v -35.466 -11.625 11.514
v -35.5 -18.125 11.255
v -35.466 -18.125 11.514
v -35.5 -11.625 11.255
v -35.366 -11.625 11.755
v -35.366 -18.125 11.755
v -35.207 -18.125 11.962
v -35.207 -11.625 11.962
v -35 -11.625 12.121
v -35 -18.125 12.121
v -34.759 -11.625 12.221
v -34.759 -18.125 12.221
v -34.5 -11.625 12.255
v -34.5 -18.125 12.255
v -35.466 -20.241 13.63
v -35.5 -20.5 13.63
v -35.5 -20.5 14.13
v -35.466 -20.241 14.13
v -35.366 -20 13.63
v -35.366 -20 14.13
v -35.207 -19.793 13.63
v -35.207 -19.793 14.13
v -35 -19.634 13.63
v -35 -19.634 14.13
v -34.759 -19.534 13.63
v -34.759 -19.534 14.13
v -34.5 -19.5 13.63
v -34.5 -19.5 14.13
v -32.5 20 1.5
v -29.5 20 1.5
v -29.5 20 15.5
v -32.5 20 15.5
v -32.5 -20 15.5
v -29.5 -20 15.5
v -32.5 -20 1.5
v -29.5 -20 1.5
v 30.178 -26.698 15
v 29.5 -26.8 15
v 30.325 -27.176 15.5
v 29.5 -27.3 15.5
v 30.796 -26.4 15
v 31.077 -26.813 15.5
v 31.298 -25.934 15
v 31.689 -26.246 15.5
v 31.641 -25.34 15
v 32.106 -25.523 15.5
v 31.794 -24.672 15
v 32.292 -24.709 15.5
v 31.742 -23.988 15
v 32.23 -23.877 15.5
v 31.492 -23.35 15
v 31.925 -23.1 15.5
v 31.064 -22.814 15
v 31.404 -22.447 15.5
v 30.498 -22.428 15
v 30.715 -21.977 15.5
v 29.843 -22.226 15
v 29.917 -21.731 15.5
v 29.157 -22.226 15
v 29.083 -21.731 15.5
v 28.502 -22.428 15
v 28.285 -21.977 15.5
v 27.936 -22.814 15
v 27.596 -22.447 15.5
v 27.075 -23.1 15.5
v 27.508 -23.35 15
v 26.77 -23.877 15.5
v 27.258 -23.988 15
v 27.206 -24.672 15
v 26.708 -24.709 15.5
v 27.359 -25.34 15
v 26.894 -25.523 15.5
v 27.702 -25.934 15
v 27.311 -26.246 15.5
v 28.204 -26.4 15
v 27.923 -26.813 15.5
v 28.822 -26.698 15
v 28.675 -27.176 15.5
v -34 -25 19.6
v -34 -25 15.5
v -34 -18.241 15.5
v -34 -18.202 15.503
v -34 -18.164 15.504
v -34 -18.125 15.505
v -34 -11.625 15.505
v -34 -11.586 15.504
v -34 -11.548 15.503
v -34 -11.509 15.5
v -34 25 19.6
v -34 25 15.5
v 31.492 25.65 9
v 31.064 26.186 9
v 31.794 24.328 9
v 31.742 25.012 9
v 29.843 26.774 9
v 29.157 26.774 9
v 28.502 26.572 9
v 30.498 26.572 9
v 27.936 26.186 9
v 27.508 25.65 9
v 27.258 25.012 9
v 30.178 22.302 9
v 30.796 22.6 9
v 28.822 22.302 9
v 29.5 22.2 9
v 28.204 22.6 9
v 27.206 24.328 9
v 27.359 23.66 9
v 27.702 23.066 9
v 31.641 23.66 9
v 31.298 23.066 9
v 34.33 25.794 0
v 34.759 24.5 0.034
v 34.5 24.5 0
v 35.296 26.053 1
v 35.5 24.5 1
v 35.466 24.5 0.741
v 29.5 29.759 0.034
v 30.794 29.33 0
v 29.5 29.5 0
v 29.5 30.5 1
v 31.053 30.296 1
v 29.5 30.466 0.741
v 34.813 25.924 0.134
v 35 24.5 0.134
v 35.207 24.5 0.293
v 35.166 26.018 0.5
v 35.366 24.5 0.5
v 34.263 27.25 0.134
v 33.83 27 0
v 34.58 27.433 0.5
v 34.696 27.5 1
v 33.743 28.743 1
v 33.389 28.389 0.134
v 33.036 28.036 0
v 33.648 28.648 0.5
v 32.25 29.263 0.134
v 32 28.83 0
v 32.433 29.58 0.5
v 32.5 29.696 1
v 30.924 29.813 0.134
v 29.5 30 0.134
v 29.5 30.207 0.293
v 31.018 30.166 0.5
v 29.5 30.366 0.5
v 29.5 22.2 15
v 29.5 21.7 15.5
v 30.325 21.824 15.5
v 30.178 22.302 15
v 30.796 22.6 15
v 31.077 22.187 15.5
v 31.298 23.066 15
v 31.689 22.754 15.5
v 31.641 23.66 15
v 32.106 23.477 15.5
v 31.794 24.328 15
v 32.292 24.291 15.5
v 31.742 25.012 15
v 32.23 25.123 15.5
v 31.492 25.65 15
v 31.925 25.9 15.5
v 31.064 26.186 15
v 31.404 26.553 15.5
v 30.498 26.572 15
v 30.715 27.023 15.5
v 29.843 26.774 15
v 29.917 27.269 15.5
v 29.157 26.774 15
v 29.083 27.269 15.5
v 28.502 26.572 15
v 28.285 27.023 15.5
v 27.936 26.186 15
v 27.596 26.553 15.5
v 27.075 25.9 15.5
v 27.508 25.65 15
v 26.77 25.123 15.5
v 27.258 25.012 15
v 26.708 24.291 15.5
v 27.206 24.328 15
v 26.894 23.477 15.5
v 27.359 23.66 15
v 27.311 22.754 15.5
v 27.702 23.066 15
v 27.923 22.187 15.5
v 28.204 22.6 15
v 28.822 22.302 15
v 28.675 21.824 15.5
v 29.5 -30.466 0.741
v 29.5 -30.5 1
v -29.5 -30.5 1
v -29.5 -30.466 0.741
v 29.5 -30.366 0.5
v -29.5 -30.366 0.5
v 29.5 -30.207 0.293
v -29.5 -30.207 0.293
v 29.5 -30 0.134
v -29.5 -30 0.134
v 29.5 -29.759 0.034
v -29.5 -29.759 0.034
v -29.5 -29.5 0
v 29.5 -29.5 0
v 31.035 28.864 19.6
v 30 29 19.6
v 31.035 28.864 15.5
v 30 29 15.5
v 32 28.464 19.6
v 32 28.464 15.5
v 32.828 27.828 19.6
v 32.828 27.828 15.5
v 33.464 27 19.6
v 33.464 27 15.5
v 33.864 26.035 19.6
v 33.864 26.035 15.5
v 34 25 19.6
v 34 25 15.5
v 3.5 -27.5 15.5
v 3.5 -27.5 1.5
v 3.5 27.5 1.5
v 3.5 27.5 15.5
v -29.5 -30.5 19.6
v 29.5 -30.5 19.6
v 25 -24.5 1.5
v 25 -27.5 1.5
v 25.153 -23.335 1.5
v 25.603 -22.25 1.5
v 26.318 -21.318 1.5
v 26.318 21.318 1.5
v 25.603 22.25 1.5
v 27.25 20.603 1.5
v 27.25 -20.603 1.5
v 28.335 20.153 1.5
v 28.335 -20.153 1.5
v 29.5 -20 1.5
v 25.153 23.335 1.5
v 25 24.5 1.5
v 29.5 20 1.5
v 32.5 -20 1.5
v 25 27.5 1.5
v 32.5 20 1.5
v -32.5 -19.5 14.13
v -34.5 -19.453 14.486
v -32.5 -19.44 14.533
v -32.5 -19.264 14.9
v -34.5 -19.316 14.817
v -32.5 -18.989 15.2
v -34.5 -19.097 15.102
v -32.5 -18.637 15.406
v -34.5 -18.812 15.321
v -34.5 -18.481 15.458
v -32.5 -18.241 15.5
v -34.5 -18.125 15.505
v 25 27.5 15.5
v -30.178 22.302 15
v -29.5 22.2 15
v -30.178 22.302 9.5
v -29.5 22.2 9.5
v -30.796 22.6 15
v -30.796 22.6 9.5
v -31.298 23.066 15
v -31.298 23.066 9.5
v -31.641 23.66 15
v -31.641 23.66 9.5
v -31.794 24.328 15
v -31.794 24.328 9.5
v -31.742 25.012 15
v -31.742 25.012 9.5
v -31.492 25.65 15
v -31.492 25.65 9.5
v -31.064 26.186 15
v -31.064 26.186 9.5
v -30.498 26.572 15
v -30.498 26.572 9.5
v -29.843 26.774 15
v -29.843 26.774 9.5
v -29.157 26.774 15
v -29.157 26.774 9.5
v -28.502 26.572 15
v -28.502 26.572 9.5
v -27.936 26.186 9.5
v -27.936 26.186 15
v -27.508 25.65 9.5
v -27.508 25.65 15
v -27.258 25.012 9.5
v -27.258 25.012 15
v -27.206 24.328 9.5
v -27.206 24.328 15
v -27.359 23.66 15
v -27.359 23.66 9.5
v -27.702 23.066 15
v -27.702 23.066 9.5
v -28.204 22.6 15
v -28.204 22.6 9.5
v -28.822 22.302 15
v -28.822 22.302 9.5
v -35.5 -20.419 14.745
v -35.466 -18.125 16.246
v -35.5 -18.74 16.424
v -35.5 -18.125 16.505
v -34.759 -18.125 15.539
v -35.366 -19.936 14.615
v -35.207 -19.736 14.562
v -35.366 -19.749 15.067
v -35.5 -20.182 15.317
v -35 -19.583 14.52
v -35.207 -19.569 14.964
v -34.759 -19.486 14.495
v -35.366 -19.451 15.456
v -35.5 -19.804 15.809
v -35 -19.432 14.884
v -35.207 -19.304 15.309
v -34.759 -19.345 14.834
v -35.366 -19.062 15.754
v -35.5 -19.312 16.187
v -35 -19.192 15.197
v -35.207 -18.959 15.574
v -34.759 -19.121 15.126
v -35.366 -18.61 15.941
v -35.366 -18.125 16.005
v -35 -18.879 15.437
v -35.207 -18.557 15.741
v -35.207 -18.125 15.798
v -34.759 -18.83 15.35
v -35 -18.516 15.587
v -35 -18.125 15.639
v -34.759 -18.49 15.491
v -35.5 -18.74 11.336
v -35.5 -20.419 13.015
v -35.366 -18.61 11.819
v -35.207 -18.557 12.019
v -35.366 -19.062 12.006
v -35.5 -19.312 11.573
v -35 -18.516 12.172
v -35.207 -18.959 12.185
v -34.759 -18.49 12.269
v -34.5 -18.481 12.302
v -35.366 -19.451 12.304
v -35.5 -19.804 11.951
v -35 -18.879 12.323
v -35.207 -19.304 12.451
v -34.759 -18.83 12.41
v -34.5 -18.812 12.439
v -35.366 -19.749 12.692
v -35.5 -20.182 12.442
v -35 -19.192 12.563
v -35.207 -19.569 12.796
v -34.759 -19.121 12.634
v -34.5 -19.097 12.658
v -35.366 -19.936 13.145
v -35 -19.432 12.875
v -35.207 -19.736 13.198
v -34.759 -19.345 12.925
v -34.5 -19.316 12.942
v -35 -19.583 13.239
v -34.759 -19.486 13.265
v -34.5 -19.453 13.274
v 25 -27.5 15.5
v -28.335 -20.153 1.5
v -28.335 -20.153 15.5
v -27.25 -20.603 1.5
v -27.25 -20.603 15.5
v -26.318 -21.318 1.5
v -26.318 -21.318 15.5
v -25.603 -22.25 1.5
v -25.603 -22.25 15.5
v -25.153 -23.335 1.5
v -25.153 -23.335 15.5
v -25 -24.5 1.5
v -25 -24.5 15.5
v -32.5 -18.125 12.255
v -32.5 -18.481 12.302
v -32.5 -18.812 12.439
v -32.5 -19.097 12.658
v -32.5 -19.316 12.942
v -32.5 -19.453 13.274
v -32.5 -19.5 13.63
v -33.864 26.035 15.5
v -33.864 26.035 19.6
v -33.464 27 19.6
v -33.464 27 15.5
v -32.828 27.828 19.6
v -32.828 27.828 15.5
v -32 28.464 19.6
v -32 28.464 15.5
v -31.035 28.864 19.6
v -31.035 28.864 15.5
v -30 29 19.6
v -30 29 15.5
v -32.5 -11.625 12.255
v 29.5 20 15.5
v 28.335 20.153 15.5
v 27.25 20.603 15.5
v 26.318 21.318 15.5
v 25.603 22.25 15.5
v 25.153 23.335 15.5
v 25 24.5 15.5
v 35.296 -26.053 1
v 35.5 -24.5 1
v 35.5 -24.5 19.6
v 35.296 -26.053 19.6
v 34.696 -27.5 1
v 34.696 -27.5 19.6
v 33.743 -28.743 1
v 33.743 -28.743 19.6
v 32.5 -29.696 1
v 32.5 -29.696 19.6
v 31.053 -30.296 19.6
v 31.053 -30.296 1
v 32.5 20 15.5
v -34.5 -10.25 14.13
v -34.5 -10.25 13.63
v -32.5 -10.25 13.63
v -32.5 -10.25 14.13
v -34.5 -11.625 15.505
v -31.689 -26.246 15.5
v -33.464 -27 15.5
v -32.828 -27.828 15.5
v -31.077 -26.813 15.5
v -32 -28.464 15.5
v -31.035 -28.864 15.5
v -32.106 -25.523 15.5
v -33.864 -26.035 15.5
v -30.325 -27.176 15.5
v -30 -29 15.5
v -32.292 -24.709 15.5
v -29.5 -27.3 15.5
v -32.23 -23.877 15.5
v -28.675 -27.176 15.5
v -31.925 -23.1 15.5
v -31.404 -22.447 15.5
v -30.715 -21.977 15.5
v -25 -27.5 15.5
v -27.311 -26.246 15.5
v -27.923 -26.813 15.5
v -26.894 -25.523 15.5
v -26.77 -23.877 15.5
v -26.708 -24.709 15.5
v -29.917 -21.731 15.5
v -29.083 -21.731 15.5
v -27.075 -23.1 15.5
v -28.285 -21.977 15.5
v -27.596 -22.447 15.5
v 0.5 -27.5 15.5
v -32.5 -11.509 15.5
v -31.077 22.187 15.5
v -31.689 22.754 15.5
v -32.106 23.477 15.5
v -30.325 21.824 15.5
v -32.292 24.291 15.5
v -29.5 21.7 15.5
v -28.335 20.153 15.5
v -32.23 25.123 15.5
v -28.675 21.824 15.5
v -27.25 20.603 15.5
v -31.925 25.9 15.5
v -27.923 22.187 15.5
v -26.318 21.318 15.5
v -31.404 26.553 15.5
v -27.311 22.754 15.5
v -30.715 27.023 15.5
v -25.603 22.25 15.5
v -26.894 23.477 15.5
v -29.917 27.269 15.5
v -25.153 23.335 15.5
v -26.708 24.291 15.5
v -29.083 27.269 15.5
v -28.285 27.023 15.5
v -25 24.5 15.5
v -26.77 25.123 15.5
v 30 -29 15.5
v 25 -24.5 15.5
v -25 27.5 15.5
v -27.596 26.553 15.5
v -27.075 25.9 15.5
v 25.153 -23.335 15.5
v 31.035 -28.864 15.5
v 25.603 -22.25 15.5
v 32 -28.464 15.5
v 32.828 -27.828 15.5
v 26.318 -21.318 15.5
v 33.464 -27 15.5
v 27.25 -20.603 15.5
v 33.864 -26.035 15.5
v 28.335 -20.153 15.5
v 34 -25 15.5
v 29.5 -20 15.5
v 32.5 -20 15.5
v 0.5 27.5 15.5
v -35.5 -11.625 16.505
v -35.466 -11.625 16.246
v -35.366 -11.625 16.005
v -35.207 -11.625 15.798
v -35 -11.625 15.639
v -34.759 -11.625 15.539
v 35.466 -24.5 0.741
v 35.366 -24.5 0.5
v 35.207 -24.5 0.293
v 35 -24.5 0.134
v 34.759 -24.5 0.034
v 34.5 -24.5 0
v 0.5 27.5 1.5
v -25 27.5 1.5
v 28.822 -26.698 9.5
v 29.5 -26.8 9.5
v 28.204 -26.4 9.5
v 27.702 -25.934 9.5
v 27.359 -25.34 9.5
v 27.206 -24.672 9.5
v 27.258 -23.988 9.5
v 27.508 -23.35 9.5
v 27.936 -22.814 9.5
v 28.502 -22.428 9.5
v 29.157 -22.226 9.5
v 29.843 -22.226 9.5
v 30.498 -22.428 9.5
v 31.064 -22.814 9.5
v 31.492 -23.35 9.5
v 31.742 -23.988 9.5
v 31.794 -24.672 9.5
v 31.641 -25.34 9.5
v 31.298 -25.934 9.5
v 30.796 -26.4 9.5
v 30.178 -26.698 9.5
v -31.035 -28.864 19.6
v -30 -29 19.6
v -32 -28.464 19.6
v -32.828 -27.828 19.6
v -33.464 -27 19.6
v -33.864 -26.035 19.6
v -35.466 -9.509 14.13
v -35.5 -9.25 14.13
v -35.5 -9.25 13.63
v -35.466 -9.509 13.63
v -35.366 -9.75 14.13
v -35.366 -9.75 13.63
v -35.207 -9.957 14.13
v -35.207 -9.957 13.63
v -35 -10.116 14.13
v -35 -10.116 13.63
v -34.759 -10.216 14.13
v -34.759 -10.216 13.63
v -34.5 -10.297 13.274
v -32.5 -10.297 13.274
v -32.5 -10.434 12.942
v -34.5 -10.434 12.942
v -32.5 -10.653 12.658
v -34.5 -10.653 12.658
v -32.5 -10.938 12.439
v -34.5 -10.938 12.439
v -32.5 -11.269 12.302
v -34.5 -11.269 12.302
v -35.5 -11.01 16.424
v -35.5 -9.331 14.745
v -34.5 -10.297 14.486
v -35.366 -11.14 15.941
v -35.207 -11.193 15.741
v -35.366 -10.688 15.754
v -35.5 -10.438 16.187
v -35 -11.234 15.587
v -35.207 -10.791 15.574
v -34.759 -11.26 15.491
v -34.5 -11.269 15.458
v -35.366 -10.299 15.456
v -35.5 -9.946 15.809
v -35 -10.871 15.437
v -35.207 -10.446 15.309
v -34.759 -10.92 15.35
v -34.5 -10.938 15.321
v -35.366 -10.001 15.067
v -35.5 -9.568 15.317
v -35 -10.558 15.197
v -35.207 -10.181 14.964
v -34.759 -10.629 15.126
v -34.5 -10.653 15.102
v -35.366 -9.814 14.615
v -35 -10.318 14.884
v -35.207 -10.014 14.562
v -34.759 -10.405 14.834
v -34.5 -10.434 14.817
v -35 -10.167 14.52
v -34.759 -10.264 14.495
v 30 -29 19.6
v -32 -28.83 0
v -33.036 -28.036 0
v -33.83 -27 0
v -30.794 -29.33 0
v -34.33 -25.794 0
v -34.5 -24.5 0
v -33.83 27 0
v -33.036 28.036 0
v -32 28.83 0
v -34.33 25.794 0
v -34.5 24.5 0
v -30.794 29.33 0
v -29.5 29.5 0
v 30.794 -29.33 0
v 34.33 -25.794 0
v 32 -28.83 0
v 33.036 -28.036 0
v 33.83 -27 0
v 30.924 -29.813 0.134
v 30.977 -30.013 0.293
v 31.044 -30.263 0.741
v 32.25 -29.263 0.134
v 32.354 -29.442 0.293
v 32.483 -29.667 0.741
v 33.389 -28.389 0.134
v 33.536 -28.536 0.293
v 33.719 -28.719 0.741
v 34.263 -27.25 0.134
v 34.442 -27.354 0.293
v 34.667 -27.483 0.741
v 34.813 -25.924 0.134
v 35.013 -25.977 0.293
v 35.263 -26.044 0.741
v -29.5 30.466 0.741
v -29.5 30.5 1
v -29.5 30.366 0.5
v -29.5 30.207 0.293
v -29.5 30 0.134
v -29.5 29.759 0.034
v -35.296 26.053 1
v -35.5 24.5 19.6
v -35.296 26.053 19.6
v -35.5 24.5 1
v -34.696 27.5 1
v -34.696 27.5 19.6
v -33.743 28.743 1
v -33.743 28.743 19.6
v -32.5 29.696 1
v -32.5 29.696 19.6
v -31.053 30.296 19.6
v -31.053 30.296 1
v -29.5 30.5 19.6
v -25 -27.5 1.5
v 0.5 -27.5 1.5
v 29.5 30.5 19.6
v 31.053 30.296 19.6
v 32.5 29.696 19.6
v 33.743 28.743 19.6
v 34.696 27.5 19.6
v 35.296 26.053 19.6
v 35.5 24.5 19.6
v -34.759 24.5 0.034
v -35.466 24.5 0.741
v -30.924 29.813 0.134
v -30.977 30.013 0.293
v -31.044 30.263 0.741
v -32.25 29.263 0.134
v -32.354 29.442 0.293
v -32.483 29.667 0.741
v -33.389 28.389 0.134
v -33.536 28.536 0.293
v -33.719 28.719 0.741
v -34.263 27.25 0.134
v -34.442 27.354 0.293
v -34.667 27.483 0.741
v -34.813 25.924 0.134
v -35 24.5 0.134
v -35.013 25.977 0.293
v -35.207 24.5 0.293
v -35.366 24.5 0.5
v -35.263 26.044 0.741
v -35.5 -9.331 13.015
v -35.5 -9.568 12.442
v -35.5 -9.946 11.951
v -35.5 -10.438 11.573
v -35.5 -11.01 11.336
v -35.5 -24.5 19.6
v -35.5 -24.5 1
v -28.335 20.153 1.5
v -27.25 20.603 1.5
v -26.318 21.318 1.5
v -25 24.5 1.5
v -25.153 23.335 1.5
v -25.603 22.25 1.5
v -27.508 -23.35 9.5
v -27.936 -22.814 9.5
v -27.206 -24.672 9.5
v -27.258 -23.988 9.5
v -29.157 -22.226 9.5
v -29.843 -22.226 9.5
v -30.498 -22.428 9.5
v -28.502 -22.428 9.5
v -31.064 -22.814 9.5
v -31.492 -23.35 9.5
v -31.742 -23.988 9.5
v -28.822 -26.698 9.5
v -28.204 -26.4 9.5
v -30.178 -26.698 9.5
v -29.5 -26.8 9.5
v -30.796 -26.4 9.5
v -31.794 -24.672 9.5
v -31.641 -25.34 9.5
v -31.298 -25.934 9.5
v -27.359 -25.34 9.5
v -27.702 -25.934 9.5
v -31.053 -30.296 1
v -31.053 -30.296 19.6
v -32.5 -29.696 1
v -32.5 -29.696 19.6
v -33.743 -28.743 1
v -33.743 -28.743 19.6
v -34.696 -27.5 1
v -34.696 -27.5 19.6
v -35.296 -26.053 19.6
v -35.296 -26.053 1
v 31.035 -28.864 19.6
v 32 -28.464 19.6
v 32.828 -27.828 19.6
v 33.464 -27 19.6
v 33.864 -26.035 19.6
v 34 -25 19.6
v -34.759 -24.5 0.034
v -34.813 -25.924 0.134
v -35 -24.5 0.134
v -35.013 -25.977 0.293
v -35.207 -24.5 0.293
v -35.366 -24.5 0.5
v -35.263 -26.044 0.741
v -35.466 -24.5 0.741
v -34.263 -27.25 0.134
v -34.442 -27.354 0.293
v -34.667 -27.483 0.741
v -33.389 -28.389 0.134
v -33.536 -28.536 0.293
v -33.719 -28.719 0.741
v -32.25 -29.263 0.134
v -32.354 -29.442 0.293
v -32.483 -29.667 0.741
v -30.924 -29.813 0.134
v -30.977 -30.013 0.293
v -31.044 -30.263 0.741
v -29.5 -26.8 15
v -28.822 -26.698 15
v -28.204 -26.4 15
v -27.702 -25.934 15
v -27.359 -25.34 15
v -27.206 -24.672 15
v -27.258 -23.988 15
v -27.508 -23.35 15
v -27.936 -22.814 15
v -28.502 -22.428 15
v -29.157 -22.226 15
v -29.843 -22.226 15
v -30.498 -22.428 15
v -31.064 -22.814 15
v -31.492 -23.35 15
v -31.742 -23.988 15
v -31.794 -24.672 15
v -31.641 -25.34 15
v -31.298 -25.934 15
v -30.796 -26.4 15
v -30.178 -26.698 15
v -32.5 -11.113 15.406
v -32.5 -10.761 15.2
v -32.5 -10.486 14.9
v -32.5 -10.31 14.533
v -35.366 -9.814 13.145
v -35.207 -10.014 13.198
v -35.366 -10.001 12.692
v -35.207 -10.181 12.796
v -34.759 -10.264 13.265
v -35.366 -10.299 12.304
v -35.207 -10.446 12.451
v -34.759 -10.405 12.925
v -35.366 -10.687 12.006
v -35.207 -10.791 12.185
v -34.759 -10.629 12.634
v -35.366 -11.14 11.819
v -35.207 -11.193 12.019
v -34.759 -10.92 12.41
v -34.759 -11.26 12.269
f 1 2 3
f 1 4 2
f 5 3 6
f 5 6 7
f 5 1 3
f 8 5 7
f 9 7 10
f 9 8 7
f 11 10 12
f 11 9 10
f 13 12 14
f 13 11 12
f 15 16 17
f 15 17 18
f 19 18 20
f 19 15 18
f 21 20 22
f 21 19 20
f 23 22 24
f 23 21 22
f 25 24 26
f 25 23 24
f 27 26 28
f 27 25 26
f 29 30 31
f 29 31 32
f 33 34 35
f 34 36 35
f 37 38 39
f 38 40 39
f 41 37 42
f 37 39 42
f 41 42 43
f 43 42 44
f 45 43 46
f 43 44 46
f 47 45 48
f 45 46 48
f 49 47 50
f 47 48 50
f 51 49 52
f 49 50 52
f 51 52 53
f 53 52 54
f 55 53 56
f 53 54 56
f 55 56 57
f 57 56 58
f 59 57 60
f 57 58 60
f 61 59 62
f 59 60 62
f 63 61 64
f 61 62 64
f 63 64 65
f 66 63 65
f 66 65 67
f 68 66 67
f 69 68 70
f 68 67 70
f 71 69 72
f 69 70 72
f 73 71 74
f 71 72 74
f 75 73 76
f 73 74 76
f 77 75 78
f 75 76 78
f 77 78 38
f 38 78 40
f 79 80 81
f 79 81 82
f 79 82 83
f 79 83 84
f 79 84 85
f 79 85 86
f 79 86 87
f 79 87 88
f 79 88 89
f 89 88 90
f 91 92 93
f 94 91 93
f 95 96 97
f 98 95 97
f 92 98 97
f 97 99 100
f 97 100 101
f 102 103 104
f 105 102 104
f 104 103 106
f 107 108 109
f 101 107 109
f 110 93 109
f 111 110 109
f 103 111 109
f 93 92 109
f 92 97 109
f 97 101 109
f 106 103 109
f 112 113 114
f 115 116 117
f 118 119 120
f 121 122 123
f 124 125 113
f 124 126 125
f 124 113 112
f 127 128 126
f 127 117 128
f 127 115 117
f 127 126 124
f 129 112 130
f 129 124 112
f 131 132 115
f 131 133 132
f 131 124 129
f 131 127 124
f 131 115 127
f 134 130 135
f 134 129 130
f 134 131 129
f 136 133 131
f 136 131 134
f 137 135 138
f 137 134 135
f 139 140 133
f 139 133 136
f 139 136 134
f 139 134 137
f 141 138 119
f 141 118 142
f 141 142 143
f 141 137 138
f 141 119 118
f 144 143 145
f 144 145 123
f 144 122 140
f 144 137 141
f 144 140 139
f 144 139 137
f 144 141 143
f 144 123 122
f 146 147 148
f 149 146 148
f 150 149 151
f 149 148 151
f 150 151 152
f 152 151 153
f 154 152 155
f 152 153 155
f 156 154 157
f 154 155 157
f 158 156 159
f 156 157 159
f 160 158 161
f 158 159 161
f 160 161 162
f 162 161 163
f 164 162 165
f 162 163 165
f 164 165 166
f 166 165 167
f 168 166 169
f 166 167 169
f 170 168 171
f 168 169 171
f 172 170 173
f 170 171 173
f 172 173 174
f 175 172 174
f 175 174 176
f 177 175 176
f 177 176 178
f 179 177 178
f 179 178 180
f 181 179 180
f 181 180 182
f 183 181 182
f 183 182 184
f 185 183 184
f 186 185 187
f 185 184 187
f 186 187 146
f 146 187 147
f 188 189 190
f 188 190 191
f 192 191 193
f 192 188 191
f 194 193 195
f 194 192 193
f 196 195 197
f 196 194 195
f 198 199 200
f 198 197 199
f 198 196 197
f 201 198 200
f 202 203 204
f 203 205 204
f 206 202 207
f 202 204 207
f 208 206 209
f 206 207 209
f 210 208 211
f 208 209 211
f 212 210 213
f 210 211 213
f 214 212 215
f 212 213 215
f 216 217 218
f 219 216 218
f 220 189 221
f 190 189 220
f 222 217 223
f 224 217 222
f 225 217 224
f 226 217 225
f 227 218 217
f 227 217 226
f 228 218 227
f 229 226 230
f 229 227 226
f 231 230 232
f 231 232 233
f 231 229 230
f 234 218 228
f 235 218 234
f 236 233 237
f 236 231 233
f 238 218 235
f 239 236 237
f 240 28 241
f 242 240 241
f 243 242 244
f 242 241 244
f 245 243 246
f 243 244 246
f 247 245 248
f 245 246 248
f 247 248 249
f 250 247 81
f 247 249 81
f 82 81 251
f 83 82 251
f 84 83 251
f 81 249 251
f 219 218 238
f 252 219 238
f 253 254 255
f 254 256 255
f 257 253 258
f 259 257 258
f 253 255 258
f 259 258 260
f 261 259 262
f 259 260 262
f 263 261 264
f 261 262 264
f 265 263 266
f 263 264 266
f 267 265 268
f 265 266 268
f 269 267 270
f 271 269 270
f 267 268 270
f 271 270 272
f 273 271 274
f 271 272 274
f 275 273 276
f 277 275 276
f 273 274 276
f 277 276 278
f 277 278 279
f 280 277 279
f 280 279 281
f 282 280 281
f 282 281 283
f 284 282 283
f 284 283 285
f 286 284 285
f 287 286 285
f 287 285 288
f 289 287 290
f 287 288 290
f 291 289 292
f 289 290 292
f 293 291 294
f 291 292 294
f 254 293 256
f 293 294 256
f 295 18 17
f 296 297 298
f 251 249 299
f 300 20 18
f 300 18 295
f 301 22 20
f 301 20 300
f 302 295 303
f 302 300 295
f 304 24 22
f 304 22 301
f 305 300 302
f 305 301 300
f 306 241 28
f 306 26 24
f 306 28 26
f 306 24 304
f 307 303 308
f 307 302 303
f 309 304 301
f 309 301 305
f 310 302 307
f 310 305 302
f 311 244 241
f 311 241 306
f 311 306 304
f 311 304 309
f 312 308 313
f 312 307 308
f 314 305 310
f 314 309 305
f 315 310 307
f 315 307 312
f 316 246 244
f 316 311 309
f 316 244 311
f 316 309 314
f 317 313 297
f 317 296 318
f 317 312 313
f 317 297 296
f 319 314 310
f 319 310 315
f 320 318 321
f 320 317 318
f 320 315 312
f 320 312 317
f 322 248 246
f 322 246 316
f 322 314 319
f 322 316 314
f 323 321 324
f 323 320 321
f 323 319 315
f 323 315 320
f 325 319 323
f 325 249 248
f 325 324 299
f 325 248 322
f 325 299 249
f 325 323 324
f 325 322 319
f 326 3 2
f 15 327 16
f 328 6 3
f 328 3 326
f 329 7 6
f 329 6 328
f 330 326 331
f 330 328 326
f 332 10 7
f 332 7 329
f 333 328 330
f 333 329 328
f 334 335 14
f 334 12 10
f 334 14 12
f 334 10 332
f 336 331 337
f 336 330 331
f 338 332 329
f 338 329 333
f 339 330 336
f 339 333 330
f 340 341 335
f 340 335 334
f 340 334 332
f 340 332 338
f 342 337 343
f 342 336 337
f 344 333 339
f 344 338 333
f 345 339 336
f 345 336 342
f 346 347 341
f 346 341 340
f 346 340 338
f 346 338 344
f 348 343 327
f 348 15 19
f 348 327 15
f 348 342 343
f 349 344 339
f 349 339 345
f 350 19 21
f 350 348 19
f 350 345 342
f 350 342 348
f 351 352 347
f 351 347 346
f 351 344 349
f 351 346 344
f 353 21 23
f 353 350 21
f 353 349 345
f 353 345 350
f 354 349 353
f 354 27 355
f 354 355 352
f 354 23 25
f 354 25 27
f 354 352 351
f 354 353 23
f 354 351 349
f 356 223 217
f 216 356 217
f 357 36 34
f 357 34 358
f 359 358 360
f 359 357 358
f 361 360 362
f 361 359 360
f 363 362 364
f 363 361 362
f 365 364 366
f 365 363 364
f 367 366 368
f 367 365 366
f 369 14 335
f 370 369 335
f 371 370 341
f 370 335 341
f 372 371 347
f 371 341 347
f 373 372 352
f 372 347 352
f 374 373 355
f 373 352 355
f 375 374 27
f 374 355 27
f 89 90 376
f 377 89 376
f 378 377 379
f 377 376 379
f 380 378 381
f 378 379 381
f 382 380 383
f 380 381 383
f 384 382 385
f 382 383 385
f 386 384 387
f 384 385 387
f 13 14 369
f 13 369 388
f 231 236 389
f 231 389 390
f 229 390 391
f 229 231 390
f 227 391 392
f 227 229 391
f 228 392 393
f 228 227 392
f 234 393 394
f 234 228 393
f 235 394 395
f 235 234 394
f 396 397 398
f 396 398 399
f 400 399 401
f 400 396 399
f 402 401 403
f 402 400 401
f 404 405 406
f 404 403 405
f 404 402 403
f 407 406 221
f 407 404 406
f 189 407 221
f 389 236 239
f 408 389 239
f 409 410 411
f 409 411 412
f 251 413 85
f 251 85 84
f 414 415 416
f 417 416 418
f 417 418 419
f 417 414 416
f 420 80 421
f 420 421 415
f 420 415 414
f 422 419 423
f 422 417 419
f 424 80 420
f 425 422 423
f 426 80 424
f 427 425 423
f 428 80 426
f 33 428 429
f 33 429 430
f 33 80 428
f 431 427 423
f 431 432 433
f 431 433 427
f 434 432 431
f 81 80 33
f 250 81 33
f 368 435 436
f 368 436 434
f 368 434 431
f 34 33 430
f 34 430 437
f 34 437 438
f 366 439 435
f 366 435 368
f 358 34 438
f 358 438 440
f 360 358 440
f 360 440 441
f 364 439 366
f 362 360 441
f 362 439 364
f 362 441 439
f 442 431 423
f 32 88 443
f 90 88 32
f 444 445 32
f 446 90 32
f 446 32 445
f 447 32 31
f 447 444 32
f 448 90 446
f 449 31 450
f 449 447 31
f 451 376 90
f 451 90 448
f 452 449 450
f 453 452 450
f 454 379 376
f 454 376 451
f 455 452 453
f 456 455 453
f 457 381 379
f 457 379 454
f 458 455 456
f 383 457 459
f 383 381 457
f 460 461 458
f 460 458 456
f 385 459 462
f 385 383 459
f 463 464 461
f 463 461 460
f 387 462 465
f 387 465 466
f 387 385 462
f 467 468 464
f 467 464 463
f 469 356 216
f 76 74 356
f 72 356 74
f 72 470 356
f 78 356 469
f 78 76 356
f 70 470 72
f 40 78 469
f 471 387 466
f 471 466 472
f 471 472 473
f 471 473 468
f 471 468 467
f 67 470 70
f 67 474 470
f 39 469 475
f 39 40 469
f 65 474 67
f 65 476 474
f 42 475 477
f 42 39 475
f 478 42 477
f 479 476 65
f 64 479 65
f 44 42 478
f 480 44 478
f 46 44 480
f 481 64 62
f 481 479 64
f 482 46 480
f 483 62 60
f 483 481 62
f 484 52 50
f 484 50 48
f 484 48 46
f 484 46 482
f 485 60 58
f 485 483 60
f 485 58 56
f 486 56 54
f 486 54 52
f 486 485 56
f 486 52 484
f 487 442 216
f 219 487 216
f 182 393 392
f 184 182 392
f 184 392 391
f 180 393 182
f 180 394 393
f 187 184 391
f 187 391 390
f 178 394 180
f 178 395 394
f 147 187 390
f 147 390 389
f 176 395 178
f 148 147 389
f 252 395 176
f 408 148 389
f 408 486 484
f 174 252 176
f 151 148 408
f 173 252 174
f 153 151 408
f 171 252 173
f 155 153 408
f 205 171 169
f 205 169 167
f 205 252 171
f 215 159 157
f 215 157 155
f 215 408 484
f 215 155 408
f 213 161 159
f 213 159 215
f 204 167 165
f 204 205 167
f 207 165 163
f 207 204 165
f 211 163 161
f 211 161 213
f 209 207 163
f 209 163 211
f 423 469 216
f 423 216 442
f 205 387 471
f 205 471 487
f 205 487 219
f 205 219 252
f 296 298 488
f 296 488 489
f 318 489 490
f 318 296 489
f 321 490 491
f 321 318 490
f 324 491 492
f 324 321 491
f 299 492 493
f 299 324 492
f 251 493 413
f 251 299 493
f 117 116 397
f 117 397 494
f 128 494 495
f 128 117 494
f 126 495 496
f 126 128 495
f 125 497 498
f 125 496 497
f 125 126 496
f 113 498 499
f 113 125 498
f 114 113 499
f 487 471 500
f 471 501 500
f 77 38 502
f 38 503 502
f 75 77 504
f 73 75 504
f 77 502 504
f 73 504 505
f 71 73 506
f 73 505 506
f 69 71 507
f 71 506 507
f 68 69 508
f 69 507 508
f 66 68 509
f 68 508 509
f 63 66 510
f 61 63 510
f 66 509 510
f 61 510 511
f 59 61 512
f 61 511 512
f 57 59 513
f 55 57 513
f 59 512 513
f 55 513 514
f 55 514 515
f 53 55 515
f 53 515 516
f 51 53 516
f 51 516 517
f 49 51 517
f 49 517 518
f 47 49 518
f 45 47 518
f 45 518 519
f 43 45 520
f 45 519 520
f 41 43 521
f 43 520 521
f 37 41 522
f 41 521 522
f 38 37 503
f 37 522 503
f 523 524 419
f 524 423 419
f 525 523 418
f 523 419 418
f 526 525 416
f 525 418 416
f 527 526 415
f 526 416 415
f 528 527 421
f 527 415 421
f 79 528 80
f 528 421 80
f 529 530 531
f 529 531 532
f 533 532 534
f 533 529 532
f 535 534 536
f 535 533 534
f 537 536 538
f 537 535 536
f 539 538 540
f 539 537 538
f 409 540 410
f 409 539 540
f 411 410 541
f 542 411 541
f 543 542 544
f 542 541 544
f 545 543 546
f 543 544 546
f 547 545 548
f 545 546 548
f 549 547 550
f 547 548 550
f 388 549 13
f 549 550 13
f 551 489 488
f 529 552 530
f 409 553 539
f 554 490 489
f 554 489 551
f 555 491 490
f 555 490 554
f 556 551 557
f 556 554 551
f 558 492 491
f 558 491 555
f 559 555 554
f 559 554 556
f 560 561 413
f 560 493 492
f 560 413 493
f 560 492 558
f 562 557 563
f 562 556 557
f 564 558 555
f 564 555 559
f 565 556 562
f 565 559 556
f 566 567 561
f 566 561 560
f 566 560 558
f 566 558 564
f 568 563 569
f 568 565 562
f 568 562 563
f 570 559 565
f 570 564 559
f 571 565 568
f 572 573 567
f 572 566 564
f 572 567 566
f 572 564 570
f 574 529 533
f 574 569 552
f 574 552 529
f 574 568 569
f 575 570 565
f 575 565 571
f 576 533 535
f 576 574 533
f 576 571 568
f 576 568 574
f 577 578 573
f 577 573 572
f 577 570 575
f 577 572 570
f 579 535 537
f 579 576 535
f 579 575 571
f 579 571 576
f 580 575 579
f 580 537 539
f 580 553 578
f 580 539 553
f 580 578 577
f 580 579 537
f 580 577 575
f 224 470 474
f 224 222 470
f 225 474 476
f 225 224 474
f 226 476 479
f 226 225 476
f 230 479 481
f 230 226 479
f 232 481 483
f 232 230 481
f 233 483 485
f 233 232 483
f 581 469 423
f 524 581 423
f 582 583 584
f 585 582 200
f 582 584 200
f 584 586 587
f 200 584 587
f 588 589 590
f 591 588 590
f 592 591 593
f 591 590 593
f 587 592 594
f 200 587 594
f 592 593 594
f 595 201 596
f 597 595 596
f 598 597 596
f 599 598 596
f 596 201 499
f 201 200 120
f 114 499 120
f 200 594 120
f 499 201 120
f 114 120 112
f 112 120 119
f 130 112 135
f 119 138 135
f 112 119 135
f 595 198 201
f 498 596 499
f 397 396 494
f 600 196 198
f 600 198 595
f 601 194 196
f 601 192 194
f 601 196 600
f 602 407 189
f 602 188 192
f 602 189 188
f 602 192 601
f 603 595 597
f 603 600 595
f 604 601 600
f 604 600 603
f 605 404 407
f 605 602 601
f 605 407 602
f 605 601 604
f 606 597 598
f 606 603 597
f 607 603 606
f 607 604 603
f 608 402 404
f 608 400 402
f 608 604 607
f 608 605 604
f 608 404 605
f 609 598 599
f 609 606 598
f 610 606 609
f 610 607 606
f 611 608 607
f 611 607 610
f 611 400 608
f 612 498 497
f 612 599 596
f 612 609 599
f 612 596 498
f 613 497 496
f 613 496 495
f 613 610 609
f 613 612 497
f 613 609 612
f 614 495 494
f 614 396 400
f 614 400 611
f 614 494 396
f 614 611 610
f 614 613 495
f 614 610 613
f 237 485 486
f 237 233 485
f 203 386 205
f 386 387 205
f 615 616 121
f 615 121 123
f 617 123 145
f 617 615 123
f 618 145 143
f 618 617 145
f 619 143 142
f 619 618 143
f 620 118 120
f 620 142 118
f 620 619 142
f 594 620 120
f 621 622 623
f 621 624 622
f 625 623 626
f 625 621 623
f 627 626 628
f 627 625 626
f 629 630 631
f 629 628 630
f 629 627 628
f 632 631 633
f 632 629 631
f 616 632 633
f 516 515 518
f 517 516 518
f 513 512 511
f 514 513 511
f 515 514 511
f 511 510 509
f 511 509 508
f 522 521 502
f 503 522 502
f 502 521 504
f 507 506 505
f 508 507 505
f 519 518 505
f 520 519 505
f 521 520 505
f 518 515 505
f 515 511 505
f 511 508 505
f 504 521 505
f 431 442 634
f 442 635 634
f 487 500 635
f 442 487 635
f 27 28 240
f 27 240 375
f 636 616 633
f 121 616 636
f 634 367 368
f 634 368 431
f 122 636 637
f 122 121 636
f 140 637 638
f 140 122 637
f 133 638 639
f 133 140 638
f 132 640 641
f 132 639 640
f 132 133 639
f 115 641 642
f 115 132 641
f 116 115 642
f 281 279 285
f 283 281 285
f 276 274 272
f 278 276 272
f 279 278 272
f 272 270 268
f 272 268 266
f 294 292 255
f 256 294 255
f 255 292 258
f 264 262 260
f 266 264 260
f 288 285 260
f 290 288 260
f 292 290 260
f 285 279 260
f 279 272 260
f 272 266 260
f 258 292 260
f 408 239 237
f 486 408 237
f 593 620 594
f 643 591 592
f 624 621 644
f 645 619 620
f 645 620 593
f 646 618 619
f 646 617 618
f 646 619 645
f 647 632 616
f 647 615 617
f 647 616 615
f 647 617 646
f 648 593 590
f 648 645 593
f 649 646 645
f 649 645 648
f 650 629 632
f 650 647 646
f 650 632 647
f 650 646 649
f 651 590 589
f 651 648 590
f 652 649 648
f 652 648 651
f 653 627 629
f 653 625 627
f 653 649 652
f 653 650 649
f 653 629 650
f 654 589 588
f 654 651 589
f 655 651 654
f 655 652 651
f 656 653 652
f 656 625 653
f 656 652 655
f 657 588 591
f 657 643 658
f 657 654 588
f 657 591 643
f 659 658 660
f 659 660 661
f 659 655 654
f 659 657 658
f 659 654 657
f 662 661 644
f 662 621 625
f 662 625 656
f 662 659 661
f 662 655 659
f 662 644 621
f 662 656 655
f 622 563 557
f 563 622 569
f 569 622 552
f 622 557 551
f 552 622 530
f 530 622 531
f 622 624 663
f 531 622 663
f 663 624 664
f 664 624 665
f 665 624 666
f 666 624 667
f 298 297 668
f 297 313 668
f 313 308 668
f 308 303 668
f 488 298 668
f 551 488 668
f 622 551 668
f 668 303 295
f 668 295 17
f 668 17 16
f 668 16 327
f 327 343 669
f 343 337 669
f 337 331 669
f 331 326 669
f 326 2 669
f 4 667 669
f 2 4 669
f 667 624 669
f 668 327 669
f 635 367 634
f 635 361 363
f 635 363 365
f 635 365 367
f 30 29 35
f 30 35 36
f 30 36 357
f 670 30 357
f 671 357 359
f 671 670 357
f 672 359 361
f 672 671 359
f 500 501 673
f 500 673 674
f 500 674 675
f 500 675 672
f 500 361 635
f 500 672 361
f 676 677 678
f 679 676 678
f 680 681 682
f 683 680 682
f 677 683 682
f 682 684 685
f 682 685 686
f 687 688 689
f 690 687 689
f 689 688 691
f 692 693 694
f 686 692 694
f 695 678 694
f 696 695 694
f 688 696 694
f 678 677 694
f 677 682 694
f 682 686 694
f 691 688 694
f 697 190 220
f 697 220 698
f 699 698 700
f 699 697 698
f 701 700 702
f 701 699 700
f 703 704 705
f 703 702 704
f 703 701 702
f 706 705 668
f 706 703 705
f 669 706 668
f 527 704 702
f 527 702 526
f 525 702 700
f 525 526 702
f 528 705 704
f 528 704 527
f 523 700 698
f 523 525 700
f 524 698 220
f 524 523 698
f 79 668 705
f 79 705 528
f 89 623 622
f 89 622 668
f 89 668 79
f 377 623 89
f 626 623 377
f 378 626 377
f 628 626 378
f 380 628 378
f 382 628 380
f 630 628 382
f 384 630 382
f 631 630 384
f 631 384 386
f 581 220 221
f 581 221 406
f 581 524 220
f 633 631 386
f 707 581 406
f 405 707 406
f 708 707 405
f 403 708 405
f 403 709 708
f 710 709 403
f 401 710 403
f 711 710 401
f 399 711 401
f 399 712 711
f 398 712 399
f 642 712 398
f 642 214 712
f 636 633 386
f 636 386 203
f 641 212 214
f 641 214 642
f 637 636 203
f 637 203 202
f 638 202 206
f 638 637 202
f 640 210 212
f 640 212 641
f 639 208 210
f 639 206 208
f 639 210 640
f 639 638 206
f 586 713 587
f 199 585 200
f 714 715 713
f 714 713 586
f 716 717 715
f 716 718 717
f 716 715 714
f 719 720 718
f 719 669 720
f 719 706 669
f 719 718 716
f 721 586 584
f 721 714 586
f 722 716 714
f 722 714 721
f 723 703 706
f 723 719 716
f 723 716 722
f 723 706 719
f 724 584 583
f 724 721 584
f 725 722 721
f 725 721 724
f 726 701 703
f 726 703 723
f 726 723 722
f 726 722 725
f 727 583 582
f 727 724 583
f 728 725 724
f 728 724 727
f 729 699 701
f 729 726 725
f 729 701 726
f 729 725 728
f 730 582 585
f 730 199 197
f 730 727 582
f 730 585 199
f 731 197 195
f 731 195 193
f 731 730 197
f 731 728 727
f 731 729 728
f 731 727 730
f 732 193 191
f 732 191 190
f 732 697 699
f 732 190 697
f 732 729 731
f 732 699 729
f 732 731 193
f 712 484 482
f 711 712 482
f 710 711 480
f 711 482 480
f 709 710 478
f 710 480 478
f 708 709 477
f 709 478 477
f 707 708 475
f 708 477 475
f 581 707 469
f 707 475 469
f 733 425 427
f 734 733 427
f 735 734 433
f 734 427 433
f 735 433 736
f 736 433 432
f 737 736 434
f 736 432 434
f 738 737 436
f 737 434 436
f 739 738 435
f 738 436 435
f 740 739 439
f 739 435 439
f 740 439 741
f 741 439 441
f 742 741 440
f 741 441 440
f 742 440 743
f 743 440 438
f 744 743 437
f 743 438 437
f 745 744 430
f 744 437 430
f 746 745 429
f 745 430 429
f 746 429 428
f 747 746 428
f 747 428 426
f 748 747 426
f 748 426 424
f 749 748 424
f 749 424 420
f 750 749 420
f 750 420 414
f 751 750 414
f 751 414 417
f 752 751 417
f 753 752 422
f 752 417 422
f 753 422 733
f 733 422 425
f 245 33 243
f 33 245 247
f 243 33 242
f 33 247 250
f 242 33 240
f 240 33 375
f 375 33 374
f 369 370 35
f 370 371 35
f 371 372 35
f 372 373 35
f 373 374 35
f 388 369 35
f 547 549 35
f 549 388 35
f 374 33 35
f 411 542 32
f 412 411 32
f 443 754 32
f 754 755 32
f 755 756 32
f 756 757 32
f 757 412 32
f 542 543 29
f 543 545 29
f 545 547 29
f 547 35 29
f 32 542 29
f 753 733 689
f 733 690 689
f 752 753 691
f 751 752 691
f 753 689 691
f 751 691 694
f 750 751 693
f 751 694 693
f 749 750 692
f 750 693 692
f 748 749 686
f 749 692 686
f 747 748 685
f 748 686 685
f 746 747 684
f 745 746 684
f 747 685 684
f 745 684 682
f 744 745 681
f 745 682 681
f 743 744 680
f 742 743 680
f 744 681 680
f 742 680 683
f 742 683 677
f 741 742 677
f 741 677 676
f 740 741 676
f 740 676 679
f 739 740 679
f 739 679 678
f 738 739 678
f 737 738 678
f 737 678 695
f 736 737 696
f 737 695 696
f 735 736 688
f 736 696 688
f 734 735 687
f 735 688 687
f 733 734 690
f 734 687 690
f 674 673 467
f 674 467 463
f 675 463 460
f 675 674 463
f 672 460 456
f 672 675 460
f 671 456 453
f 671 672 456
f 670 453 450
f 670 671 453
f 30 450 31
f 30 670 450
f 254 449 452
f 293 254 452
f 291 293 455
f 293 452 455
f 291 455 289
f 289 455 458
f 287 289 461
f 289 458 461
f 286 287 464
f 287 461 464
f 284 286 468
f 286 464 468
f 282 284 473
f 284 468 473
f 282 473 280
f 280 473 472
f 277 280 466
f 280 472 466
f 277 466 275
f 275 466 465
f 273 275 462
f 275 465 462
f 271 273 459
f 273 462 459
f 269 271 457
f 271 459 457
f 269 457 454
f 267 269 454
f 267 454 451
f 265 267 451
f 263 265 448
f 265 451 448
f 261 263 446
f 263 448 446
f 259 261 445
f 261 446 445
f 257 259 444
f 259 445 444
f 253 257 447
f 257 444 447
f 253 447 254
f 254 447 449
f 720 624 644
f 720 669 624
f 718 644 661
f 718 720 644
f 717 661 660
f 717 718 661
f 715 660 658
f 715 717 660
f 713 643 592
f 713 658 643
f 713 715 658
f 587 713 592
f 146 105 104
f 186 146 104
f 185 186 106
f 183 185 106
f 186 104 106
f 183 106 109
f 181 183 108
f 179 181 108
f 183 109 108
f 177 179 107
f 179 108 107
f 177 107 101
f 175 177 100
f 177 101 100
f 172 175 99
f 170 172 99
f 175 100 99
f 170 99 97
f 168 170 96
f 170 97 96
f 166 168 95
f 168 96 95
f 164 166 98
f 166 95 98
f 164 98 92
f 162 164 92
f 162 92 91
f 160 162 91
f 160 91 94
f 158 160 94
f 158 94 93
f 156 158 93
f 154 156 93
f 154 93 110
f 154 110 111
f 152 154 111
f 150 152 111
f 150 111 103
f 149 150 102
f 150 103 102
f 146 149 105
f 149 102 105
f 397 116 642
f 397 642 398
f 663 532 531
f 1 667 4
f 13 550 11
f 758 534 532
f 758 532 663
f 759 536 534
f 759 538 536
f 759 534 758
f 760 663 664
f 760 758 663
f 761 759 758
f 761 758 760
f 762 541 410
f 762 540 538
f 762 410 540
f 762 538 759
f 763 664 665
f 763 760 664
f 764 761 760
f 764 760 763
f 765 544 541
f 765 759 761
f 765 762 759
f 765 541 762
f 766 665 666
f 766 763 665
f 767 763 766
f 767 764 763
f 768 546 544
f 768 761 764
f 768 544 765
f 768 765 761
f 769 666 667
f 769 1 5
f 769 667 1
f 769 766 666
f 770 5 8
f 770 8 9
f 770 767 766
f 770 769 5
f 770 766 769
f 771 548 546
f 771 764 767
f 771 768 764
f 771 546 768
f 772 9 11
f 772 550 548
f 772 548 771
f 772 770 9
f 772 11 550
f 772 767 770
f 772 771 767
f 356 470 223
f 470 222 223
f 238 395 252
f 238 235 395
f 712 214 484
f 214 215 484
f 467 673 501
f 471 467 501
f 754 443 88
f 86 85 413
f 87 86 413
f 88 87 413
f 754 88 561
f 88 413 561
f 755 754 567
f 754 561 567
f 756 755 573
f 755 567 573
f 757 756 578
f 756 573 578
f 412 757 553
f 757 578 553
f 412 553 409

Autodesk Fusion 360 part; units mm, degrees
sketch "main-bottom" plane through (0, 0, 0) normal (0, 0, 1) x (1, 0, 0)
  line L0 (30, -29) -> (-30, -29)
  line L1 (-34, -25) -> (-34, 25)
  line L2 (-30, 29) -> (30, 29)
  line L3 (34, 25) -> (34, -25)
  arc A0 (-30, 29) -> (-34, 25) centre (-30, 25) ccw
  arc A1 (-34, -25) -> (-30, -29) centre (-30, -25) ccw
  arc A2 (30, -29) -> (34, -25) centre (30, -25) ccw
  arc A3 (34, 25) -> (30, 29) centre (30, 25) ccw
  circle A4 centre (-29.5, 24.5) radius 2.3
  circle A5 centre (29.5, 24.5) radius 2.3
  circle A6 centre (29.5, -24.5) radius 2.3
  circle A7 centre (-29.5, -24.5) radius 2.3
  line L4 (-32.5, -25) -> (-32.5, 25)
  line L5 (32.5, 25) -> (32.5, -25)
  arc A8 (-30, 27.5) -> (-32.5, 25) centre (-30, 25) ccw
  arc A9 (-32.5, -25) -> (-30, -27.5) centre (-30, -25) ccw
  arc A10 (30, -27.5) -> (32.5, -25) centre (30, -25) ccw
  arc A11 (32.5, 25) -> (30, 27.5) centre (30, 25) ccw
  arc A12 (-29.5, 20) -> (-25, 24.5) centre (-29.5, 24.5) ccw
  line L6 (-25, 24.5) -> (-25, 27.5)
  line L7 (-29.5, 20) -> (-32.5, 20)
  line L8 (-29.5, 20) -> (-32.5, 20)
  arc A13 (-29.5, 20) -> (-25, 24.5) centre (-29.5, 24.5) ccw
  line L9 (-25, 24.5) -> (-25, 27.5)
  arc A14 (-29.5, 20) -> (-25, 24.5) centre (-29.5, 24.5) ccw
  line L10 (-25, 24.5) -> (-25, 27.5)
  line L11 (-29.5, 20) -> (-32.5, 20)
  arc A15 (-25, -24.5) -> (-29.5, -20) centre (-29.5, -24.5) ccw
  line L12 (-29.5, -20) -> (-32.5, -20)
  line L13 (-25, -24.5) -> (-25, -27.5)
  arc A16 (29.5, -20) -> (25, -24.5) centre (29.5, -24.5) ccw
  line L14 (25, -24.5) -> (25, -27.5)
  line L15 (29.5, -20) -> (32.5, -20)
  arc A17 (25, 24.5) -> (29.5, 20) centre (29.5, 24.5) ccw
  line L16 (29.5, 20) -> (32.5, 20)
  line L17 (25, 24.5) -> (25, 27.5)
  line L18 (0, -27.5) -> (0.5, -27.5) construction
  line L19 (0, 27.5) -> (0.5, 27.5) construction
  line L20 (0, -27.5) -> (0.5, -27.5)
  line L21 (0, -27.5) -> (0.5, -27.5) construction
  line L22 (3.5, -27.5) -> (3.5, 27.5)
  line L23 (0.5, 27.5) -> (0.5, -27.5)
  line L24 (30, -27.5) -> (3.5, -27.5)
  line L25 (0.5, -27.5) -> (-30, -27.5)
  line L26 (-30, 27.5) -> (0.5, 27.5)
  line L27 (3.5, 27.5) -> (30, 27.5)
  arc A18 (-29.5, 30.5) -> (-35.5, 24.5) centre (-29.5, 24.5) ccw
  line L28 (-29.5, 24.5) -> (-35.5, 24.5) construction
  arc A19 (-29.5, 30.5) -> (-35.5, 24.5) centre (-29.5, 24.5) ccw
  arc A20 (35.5, 24.5) -> (29.5, 30.5) centre (29.5, 24.5) ccw
  arc A21 (-35.5, -24.5) -> (-29.5, -30.5) centre (-29.5, -24.5) ccw
  arc A22 (29.5, -30.5) -> (35.5, -24.5) centre (29.5, -24.5) ccw
  line L29 (-29.5, 30.5) -> (29.5, 30.5)
  line L30 (35.5, 24.5) -> (35.5, -24.5)
  line L31 (29.5, -30.5) -> (-29.5, -30.5)
  line L32 (-35.5, 24.5) -> (-35.5, -24.5)
  dimension "d32" = 4.6
  dimension "d33" = 4.6
  dimension "d34" = 4.6
  dimension "d35" = 4.6
  dimension "d39" = 4.5
  dimension "d40" = 4.5
  dimension "d41" = 4.5
  dimension "d42" = 4.5
  dimension "d43" = 4.5
  dimension "d44" = 4.5
extrude "Extrude4" add sketch "main-bottom" along normal blind 15.5 contours L0 L1 L2 L3 A0 A1 A2 A3 | A4 | A5 | A6 | A7 | L4 A9 A15 L12 L13 L25 | L4 A8 A12 L6 L7 L8 A13 L9 A14 L10 L11 L26 | L5 A11 A17 L16 L17 L27 | L5 A10 A16 L14 L15 L24 makes body 1
extrude "Extrude3" add sketch "main-bottom" along normal blind 1.5 separate body contours L0 L1 L2 L3 A0 A1 A2 A3 | A4 | A5 | A6 | A7 | L4 A9 A15 L12 L13 L25 | L4 A12 L6 L7 L8 A13 L9 A14 L10 L11 A15 L12 L13 L20 L23 L25 L26 | L4 A8 A12 L6 L7 L8 A13 L9 A14 L10 L11 L26 | L5 A11 A17 L16 L17 L27 | L5 A16 L14 L15 A17 L16 L17 L22 L24 L27 | L5 A10 A16 L14 L15 L24 | A18 A19 A20 A21 A22 L29 L30 L31 L32 makes body 2
extrude "Extrude5" cut sketch "main-bottom" along normal blind 19.6 contours A18 A19 A20 A21 A22 L29 L30 L31 L32 bodies 2
extrude "Extrude6" add sketch "main-bottom" along normal blind 19.6 contours A18 A19 A20 A21 A22 L29 L30 L31 L32 bodies 1 2
hole "Hole1" at (29.5, 24.5, 15.5) direction (0, 0, -1) diameter 4.6 depth 6.5 tip angle 180 countersink diameter 5.6 countersink angle 90 bodies 1
hole "Hole2" at (-29.5, 24.5, 15.5) direction (0, 0, -1) diameter 4.6 depth 6 tip angle 180 countersink diameter 5.6 countersink angle 90 bodies 1
hole "Hole3" at (-29.5, -24.5, 15.5) direction (0, 0, -1) diameter 4.6 depth 6 tip angle 180 countersink diameter 5.6 countersink angle 90 bodies 1
hole "Hole4" at (29.5, -24.5, 15.5) direction (0, 0, -1) diameter 4.6 depth 6 tip angle 180 countersink diameter 5.6 countersink angle 90 bodies 1
sketch "Sketch2" plane through (-35.5, 0, 0) normal (-1, 0, 0) x (0, 0, 1)
  line L0 (0, 24.5) -> (0, -24.5)
  line L1 (0, -24.5) -> (19.6, -24.5)
  line L2 (19.6, -24.5) -> (19.6, 24.5)
  line L3 (19.6, 24.5) -> (0, 24.5)
  line L4 (15.5049, -24.5) -> (15.5049, -19.5) construction
  line L5 (14.1299, -19.5) -> (13.6299, -19.5)
  line L6 (12.2549, -18.125) -> (12.2549, -11.625)
  line L7 (13.6299, -10.25) -> (14.1299, -10.25)
  line L8 (15.5049, -11.625) -> (15.5049, -18.125)
  line L9 (12.2549, -10.25) -> (15.5049, -19.5) construction
  line L10 (12.2549, -19.5) -> (15.5049, -10.25) construction
  line L11 (15.5049, -19.5) -> (14.1299, -19.5) construction
  line L12 (14.1299, -19.5) -> (14.1299, -18.125) construction
  line L13 (14.1299, -18.125) -> (15.5049, -18.125) construction
  line L14 (15.5049, -18.125) -> (15.5049, -19.5) construction
  line L15 (12.2549, -19.5) -> (13.6299, -19.5) construction
  line L16 (13.6299, -19.5) -> (13.6299, -18.125) construction
  line L17 (13.6299, -18.125) -> (12.2549, -18.125) construction
  line L18 (12.2549, -18.125) -> (12.2549, -19.5) construction
  arc A0 (12.2549, -18.125) -> (13.6299, -19.5) centre (13.6299, -18.125) ccw
  arc A1 (15.0049, -18.125) -> (15.004, -18.0743) centre (13.6299, -18.125) ccw
  arc A2 (12.7558, -18.0743) -> (12.7549, -18.125) centre (14.1299, -18.125) ccw
  arc A3 (14.1299, -19.5) -> (15.5049, -18.125) centre (14.1299, -18.125) ccw
  line L19 (15.5049, -10.25) -> (14.1299, -10.25) construction
  line L20 (14.1299, -10.25) -> (14.1299, -11.625) construction
  line L21 (14.1299, -11.625) -> (15.5049, -11.625) construction
  line L22 (15.5049, -11.625) -> (15.5049, -10.25) construction
  line L23 (12.2549, -10.25) -> (13.6299, -10.25) construction
  line L24 (13.6299, -10.25) -> (13.6299, -11.625) construction
  line L25 (13.6299, -11.625) -> (12.2549, -11.625) construction
  line L26 (12.2549, -11.625) -> (12.2549, -10.25) construction
  arc A4 (15.5049, -11.625) -> (14.1299, -10.25) centre (14.1299, -11.625) ccw
  arc A5 (12.7549, -11.625) -> (12.7558, -11.6757) centre (14.1299, -11.625) ccw
  arc A6 (15.004, -11.6757) -> (15.0049, -11.625) centre (13.6299, -11.625) ccw
  arc A7 (13.6299, -10.25) -> (12.2549, -11.625) centre (13.6299, -11.625) ccw
  dimension "d88" = 5
  dimension "d89" = 3.25
  dimension "d90" = 9.25
  dimension "d93" = 1.375
  dimension "d94" = 1.375
  dimension "d95" = 1.375
  dimension "d96" = 1.375
  dimension "d97" = 1.375
  dimension "d98" = 1.375
  dimension "d99" = 1.375
  dimension "d100" = 1.375
extrude "Extrude7" cut sketch "Sketch2" against normal blind 3 contours L5 L6 L7 L8 A0 A3 A4 A7 bodies 1
fillet "Fillet1" radius 1 8 edges at (-35.5, -10.25, 13.8799) (-35.5, -10.6527, 15.1022) (-35.5, -14.875, 15.5049) (-35.5, -19.0973, 15.1022) (-35.5, -19.5, 13.8799) (-35.5, -19.0973, 12.6576) (-35.5, -14.875, 12.2549) (-35.5, -10.6527, 12.6576) on bodies 1
fillet "Fillet2" radius 1 8 edges at (33.7426, 28.7426, 0) (0, 30.5, 0) (-33.7426, 28.7426, 0) (-35.5, 0, 0) (-33.7426, -28.7426, 0) (0, -30.5, 0) (33.7426, -28.7426, 0) (35.5, 0, 0) on bodies 1
equation "M3_thread_insert_diameter = 4.6 mm"
equation "d32 = M3_thread_insert_diameter"
equation "d33 = M3_thread_insert_diameter"
equation "d34 = M3_thread_insert_diameter"
equation "d35 = M3_thread_insert_diameter"
equation "bottom_thickness = 1.5 mm"
equation "batholder_height = 13 mm"
equation "batholder_bottom_gap = 1 mm"
equation "FR4_thickness = 1.6 mm"
equation "gasket_thickness = 2.5 mm"
equation "d59 = bottom_thickness"
equation "d61 = bottom_thickness + batholder_bottom_gap + batholder_height"
equation "d63 = bottom_thickness + batholder_bottom_gap + batholder_height + FR4_thickness + gasket_thickness"
equation "d65 = bottom_thickness + batholder_bottom_gap + batholder_height + FR4_thickness + gasket_thickness"
equation "M3_thread_insert_height = 6 mm"
equation "d68 = M3_thread_insert_height + 0.5 mm"
equation "d69 = M3_thread_insert_diameter"
equation "d71 = M3_thread_insert_diameter + 1 mm"
equation "d73 = M3_thread_insert_height"
equation "d74 = M3_thread_insert_diameter"
equation "d76 = M3_thread_insert_diameter + 1 mm"
equation "d78 = M3_thread_insert_height"
equation "d79 = M3_thread_insert_diameter"
equation "d81 = M3_thread_insert_diameter + 1 mm"
equation "d83 = M3_thread_insert_height"
equation "d84 = M3_thread_insert_diameter"
equation "d86 = M3_thread_insert_diameter + 1 mm"
